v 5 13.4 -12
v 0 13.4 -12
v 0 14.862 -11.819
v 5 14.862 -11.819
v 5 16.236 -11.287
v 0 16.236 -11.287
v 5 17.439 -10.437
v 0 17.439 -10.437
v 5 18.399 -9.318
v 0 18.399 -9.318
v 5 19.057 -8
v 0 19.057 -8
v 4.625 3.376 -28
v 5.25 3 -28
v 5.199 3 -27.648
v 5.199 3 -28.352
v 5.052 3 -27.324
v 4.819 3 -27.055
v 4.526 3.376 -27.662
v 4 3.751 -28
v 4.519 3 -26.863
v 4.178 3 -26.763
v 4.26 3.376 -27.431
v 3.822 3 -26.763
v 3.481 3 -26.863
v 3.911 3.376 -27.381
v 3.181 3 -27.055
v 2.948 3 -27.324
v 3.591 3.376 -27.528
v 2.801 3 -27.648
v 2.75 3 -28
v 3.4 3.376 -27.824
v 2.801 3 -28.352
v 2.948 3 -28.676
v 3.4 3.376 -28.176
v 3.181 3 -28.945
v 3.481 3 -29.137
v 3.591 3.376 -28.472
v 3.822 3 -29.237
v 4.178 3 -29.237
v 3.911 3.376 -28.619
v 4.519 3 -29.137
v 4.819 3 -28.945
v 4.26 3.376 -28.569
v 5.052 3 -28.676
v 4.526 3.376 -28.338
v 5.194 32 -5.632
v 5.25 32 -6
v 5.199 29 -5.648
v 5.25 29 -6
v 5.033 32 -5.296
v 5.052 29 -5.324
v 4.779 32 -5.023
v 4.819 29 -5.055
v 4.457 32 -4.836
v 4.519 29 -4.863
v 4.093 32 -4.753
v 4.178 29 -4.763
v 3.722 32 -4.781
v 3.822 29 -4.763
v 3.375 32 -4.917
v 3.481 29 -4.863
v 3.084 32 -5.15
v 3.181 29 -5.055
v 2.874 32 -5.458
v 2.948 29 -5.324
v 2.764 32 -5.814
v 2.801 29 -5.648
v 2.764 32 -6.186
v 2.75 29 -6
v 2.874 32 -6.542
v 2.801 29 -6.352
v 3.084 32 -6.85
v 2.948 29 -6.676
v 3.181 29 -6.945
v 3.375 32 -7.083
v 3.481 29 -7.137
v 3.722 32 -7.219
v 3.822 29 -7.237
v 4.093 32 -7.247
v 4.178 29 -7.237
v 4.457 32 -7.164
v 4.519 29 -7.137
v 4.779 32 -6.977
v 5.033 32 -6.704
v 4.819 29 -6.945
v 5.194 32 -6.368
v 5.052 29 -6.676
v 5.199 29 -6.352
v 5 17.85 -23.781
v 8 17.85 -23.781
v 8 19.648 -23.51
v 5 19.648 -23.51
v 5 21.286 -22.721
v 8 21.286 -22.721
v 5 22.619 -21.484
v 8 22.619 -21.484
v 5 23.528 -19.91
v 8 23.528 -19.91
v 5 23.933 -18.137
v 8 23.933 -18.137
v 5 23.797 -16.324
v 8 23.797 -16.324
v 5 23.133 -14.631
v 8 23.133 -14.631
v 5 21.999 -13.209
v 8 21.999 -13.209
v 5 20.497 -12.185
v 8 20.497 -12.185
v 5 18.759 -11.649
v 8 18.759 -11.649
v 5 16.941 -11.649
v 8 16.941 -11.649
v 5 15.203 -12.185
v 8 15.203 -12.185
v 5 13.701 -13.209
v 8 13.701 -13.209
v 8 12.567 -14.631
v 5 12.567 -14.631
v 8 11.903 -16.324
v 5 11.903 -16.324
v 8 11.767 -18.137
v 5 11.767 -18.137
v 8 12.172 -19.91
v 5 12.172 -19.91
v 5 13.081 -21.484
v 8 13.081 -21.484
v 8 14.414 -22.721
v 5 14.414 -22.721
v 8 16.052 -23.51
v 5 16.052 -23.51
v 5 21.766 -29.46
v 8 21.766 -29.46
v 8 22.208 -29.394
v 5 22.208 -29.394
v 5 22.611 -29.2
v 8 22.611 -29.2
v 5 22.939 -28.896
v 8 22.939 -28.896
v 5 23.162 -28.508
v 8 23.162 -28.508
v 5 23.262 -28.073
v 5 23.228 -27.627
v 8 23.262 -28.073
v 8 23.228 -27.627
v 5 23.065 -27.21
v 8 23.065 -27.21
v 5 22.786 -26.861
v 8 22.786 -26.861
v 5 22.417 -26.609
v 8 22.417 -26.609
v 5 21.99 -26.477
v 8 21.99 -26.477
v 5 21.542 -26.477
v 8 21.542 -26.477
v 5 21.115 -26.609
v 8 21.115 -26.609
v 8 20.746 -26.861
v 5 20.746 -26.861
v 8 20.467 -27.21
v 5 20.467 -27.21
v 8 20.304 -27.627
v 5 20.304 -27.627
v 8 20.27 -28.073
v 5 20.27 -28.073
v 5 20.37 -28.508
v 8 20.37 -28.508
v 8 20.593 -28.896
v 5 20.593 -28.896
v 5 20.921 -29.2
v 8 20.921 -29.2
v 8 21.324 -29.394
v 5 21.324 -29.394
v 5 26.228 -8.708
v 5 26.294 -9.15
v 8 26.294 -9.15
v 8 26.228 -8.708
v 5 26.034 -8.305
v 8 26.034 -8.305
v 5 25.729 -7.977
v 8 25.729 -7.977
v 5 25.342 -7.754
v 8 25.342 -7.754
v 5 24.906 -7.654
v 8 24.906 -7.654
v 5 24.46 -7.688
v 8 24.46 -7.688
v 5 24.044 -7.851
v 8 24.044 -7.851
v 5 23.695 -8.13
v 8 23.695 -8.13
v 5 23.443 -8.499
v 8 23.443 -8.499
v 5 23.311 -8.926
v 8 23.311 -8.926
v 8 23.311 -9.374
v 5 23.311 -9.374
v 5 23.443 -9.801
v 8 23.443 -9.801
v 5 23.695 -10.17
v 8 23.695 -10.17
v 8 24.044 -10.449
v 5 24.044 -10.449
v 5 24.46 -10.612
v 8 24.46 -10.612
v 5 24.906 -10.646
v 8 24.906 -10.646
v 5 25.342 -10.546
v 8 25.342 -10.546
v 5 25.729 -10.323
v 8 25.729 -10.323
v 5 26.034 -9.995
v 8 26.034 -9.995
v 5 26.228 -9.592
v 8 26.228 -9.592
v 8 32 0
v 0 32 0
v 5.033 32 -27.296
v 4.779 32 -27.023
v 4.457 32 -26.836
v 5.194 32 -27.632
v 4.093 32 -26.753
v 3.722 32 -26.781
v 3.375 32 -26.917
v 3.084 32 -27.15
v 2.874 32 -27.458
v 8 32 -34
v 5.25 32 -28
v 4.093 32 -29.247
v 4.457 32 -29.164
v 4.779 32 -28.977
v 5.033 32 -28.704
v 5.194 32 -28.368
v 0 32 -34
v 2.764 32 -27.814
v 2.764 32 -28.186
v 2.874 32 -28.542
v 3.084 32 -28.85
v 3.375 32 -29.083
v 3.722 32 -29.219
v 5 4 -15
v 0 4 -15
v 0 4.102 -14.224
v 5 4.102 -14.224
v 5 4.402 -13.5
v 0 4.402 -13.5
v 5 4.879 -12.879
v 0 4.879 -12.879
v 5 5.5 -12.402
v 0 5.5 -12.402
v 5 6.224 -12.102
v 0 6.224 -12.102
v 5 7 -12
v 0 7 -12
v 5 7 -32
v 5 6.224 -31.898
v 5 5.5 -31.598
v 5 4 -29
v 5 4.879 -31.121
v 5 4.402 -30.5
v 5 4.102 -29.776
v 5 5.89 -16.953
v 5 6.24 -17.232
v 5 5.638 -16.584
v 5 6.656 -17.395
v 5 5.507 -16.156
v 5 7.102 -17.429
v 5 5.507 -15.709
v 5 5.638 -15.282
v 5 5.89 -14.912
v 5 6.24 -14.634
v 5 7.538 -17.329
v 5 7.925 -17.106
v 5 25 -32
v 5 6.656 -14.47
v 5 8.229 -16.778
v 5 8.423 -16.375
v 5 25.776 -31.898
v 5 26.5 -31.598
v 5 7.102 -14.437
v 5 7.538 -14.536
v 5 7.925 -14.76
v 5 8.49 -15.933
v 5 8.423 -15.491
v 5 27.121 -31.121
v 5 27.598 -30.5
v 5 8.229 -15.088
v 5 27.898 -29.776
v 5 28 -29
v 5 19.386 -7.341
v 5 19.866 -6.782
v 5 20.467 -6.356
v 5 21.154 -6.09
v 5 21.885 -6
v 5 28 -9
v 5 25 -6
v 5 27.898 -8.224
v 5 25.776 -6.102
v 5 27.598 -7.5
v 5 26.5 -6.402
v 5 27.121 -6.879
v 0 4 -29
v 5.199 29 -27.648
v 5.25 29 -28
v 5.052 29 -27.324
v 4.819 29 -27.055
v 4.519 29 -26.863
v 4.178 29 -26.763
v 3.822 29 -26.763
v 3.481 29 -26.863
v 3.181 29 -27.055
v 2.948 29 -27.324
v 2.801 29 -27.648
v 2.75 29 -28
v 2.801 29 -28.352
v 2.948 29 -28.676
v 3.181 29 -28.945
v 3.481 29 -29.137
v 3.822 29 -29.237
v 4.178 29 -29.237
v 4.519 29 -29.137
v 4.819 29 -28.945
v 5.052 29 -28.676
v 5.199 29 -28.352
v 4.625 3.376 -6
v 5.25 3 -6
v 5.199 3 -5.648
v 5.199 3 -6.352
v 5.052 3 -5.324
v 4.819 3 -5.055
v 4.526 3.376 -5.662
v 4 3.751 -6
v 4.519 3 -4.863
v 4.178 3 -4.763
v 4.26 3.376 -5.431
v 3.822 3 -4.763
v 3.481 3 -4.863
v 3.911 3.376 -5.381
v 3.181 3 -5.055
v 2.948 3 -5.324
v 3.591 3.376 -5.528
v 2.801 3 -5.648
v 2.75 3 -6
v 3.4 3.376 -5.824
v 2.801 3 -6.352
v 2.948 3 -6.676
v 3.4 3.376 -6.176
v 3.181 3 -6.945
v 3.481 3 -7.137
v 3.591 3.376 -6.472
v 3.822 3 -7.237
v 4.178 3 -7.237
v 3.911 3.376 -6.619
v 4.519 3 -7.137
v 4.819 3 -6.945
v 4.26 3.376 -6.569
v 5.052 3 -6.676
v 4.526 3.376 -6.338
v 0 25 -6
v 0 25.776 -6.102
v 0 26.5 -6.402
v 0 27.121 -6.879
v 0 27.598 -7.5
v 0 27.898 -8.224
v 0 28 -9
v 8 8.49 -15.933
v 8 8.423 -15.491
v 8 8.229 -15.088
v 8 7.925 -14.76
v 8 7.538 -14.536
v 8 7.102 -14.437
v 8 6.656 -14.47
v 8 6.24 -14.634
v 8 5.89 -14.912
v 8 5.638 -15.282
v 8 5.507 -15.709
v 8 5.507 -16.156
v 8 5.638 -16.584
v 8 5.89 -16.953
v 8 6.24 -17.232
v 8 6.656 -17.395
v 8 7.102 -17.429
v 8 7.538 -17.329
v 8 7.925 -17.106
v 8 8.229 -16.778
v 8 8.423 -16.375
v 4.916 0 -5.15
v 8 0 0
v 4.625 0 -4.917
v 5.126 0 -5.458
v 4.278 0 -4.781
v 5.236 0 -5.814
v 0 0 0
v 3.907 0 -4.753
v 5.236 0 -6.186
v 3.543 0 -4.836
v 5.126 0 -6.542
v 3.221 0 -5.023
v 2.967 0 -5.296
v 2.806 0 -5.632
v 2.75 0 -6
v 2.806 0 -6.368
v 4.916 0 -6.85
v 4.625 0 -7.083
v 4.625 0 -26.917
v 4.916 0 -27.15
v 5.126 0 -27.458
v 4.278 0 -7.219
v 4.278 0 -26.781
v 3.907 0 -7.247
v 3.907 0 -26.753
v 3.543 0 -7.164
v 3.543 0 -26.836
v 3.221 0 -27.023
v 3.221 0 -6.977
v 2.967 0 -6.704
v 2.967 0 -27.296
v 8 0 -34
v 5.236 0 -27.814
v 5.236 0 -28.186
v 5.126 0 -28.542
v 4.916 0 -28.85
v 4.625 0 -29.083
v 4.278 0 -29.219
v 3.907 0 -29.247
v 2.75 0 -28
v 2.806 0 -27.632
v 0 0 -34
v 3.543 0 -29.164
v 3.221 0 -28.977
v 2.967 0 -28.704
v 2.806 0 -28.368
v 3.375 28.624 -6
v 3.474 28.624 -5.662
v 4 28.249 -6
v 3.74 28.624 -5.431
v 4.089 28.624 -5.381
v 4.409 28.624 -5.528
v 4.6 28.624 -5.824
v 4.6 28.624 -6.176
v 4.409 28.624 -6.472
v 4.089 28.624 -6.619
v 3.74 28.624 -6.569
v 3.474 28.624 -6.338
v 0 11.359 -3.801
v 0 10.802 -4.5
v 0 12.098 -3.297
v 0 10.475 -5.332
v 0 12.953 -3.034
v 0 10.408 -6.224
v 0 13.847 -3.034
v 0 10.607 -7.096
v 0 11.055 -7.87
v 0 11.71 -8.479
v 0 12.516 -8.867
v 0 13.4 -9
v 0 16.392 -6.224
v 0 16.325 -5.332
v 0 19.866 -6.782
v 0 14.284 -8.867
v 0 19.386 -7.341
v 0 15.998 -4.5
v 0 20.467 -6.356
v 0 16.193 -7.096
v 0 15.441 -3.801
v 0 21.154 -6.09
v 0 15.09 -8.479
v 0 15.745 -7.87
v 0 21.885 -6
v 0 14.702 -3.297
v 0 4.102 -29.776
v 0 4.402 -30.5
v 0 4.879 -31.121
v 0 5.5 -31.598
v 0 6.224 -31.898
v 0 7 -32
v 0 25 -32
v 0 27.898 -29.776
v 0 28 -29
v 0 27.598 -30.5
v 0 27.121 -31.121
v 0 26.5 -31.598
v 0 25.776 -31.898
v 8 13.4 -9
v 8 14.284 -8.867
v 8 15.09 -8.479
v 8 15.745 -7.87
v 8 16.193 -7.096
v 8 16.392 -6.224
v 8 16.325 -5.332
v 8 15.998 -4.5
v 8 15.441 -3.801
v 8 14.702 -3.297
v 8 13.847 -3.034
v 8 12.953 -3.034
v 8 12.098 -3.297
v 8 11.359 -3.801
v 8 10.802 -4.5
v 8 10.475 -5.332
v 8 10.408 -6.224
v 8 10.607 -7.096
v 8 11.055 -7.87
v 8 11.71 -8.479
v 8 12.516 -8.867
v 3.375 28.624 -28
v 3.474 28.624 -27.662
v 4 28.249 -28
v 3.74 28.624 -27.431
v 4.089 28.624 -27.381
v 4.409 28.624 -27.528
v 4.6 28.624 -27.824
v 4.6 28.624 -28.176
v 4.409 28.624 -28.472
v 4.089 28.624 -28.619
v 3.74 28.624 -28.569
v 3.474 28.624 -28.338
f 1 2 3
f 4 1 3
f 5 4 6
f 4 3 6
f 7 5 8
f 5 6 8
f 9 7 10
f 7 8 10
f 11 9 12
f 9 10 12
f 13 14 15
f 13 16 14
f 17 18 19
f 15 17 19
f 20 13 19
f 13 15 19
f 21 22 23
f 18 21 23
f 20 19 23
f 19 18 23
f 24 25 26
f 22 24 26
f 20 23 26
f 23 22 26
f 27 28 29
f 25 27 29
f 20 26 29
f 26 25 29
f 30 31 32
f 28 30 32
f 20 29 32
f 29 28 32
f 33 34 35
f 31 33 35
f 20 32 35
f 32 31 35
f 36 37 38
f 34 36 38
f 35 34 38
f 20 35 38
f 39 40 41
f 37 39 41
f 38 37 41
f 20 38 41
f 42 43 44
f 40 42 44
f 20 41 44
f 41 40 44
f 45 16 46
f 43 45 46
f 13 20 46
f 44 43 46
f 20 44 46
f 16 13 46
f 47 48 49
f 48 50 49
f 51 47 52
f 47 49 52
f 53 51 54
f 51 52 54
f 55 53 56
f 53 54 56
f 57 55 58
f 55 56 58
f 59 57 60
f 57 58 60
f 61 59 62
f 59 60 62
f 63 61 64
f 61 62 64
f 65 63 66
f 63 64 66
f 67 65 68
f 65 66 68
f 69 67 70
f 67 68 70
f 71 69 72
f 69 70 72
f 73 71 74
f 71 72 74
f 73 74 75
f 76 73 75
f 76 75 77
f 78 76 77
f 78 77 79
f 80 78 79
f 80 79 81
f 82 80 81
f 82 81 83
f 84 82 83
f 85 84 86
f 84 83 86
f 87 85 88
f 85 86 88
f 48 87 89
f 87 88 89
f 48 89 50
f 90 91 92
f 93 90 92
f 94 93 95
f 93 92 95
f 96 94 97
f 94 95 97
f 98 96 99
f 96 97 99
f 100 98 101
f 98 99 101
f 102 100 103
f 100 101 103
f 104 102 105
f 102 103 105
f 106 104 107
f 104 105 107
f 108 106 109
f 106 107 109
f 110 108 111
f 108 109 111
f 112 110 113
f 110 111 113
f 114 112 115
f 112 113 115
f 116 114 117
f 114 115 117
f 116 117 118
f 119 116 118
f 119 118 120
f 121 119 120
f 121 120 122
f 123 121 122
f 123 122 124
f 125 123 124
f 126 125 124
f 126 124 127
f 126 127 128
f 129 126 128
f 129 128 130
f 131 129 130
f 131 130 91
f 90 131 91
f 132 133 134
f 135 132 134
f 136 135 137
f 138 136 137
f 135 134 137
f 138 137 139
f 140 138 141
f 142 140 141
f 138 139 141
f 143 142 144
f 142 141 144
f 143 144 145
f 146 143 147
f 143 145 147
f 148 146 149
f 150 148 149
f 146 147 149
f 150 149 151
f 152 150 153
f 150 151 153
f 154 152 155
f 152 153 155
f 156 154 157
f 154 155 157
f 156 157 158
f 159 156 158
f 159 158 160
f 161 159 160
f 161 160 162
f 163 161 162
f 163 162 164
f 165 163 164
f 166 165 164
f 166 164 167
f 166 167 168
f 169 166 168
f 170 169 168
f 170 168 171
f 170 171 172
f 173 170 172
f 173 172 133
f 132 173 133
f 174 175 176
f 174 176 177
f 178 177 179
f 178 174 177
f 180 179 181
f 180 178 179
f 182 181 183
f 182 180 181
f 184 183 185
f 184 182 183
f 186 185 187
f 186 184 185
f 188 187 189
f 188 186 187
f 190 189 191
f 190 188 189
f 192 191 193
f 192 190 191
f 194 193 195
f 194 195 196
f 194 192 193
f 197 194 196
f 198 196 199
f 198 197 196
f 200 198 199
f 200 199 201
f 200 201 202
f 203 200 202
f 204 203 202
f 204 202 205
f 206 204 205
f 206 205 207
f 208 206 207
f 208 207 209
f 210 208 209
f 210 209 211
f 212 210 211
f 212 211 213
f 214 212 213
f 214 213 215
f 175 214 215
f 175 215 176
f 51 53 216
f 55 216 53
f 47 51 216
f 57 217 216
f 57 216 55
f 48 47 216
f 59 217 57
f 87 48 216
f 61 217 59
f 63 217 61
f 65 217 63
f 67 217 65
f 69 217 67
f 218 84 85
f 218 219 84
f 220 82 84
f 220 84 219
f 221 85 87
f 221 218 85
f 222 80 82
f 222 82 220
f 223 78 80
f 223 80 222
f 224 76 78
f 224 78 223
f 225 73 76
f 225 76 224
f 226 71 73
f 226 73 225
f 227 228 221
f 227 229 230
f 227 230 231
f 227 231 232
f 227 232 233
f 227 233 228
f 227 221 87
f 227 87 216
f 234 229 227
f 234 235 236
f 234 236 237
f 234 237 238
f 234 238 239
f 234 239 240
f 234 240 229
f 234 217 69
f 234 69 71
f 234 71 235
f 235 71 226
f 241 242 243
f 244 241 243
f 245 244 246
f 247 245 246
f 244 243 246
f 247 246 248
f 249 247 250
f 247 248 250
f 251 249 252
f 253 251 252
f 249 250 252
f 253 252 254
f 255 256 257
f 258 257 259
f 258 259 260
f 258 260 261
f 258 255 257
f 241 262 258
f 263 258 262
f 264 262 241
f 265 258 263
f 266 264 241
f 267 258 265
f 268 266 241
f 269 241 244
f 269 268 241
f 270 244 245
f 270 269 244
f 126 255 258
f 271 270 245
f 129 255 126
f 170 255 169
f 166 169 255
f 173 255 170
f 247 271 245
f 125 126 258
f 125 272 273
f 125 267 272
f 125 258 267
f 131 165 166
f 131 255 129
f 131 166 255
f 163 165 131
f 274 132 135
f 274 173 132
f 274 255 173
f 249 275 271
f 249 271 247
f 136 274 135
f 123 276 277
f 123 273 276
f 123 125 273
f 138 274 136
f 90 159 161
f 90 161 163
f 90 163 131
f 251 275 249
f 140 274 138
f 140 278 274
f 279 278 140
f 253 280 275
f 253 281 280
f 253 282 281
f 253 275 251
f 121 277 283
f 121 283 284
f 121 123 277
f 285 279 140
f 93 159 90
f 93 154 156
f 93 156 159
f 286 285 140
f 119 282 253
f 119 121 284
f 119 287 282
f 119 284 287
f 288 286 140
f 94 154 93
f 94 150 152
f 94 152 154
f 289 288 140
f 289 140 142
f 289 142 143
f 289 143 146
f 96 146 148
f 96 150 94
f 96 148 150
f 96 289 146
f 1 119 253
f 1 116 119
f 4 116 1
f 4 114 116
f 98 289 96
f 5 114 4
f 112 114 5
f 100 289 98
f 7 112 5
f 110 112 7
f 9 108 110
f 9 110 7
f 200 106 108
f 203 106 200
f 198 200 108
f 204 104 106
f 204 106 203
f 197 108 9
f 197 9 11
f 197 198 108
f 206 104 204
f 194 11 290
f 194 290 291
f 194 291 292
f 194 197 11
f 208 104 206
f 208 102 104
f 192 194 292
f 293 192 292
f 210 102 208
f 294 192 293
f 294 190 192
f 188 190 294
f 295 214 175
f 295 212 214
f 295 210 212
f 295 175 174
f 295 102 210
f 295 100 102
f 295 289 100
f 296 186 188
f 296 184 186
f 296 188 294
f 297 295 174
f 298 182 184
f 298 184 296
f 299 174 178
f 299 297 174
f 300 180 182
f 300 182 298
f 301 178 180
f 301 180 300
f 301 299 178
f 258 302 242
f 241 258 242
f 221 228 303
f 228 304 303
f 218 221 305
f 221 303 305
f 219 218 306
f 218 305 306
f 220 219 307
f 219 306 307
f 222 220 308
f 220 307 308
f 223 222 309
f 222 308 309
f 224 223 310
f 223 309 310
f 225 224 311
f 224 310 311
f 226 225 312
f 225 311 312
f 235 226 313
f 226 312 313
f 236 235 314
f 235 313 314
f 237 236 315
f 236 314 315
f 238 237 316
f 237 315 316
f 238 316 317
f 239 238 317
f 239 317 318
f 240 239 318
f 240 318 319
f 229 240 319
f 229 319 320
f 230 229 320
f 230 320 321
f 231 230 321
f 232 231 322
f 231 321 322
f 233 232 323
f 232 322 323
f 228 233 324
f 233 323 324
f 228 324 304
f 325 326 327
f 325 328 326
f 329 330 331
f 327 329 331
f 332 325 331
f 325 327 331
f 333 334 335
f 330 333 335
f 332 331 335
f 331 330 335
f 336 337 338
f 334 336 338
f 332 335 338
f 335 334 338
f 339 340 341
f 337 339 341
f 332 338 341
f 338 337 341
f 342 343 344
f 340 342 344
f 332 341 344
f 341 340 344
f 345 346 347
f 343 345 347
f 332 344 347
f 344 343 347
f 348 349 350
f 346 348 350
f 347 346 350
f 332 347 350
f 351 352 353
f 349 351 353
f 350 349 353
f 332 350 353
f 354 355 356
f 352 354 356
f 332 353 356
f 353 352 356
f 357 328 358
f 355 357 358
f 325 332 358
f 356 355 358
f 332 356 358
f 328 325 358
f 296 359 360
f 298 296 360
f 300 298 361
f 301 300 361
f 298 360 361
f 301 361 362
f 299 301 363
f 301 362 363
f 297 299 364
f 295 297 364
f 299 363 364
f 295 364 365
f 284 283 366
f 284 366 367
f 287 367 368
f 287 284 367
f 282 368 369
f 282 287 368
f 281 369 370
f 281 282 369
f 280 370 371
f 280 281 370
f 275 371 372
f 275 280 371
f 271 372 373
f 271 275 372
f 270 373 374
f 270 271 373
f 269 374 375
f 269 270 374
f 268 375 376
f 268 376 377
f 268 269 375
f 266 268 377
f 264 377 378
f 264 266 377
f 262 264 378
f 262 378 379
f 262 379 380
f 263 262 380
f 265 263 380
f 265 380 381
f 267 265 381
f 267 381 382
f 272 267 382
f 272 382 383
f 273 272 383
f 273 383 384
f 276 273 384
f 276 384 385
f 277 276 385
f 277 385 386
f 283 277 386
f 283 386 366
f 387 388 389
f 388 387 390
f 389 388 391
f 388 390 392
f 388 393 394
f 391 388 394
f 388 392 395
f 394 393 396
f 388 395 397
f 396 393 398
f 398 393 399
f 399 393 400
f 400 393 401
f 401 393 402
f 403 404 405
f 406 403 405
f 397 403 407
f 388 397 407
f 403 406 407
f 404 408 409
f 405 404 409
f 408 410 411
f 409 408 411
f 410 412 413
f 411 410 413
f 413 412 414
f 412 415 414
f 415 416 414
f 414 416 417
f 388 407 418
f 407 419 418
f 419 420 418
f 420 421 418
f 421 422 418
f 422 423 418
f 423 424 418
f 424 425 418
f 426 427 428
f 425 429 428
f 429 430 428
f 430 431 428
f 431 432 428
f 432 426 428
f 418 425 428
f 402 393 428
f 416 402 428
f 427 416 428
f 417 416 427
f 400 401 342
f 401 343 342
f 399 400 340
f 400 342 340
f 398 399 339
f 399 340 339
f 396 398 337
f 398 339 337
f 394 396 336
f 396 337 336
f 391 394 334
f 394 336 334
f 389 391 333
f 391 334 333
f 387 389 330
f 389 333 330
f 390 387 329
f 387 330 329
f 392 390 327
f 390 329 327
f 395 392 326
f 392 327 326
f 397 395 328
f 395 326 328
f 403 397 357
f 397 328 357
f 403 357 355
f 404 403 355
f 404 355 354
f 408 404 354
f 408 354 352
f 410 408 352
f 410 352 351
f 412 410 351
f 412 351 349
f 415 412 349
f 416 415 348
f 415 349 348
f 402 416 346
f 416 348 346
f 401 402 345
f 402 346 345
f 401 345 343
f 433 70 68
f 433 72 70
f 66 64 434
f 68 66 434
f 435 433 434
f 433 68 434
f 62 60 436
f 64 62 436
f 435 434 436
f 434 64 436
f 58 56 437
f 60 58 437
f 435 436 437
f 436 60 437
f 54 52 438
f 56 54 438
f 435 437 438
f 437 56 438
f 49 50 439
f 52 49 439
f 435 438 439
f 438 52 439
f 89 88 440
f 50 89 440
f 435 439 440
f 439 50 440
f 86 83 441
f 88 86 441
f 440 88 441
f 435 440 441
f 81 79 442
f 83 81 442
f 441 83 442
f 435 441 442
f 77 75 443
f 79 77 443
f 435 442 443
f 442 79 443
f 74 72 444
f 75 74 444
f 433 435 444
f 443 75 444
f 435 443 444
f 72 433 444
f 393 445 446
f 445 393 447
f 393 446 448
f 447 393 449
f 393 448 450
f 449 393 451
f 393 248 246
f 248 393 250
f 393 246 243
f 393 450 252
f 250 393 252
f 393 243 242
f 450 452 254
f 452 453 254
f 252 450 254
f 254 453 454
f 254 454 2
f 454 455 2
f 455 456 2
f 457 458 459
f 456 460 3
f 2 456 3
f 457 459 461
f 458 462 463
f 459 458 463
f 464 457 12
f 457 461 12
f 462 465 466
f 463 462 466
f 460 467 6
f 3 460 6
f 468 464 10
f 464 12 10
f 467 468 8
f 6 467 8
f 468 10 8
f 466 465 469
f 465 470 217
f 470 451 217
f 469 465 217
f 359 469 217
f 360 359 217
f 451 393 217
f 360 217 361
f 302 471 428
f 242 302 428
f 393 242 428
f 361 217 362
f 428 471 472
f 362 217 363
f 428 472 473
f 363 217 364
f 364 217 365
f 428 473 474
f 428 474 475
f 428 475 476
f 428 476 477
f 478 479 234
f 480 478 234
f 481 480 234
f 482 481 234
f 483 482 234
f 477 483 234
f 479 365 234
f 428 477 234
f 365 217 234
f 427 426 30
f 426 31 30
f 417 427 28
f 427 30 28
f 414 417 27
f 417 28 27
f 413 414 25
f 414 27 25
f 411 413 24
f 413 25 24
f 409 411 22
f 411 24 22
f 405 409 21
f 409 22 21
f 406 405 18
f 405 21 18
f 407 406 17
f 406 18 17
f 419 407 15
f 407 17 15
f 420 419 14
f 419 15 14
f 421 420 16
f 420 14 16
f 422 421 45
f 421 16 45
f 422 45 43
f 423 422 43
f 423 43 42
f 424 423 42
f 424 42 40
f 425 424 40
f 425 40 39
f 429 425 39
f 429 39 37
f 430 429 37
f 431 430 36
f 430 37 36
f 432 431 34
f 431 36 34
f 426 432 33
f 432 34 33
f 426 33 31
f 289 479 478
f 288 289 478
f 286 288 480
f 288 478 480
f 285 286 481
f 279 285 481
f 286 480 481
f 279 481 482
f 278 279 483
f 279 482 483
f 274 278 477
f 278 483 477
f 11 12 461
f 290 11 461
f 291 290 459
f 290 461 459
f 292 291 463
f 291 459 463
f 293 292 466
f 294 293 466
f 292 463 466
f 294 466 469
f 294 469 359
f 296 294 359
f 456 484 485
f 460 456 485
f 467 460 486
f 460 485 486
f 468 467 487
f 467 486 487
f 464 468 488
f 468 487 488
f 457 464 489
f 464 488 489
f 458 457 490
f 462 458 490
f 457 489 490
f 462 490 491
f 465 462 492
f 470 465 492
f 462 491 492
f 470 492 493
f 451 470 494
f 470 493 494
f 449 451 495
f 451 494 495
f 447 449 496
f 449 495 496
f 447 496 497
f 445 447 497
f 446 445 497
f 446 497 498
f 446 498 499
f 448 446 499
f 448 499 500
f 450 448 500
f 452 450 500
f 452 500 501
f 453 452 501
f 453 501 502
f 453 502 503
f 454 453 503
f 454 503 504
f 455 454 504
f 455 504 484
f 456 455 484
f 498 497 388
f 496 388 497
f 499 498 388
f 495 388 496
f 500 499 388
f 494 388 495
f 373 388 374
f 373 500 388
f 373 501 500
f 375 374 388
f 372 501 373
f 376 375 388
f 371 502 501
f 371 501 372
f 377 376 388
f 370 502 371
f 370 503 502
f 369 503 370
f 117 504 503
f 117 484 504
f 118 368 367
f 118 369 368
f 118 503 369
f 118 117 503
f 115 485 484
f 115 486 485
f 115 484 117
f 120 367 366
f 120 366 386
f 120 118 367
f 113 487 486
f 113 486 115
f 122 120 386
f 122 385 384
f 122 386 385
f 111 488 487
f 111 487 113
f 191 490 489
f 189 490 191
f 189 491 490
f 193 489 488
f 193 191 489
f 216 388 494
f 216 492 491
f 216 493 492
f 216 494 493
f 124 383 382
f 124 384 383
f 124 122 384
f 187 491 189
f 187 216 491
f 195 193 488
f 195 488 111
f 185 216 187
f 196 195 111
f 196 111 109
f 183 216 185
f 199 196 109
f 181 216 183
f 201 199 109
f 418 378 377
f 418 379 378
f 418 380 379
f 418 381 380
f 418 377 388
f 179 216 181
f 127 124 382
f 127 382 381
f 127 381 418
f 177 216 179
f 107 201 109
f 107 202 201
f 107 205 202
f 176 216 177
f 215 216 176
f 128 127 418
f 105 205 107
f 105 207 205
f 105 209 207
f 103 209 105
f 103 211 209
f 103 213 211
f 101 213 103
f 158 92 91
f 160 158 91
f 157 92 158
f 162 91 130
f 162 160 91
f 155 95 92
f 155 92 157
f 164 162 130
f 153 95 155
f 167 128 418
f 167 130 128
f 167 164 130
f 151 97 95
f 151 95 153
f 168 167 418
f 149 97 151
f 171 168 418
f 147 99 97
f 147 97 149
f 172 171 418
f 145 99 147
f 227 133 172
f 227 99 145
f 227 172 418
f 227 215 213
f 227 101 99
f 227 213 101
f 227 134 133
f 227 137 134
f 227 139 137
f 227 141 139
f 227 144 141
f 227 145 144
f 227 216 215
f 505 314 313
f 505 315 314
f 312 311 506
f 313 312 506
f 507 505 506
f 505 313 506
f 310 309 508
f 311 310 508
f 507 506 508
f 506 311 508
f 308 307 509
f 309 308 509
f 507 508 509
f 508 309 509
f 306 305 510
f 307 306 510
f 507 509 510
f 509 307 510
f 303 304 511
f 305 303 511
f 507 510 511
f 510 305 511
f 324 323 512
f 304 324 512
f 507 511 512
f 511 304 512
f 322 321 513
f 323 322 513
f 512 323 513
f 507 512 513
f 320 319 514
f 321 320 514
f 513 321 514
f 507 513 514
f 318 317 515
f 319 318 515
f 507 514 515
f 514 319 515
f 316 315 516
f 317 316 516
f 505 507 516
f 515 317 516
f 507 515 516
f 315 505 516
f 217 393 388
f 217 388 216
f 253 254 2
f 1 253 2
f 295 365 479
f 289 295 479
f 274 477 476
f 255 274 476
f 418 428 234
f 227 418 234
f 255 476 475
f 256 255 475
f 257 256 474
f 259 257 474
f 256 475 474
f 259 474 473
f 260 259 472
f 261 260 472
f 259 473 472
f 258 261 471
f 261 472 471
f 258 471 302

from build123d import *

# Parameters (mm, degrees)
SKETCH1_W                       = 34
SKETCH1_H                       = 32
BOSS_EXTRUDE1_DEPTH             = 8
CUT_EXTRUDE1_REACH              = 49.371
SKETCH2_R                       = 6.1
SKETCH2_R_2                     = 3
SKETCH2_R_3                     = 1.5
CIRPATTERN1_OUTLINE_R           = 1.5
CIRPATTERN1_DEPTH               = 8
CUT_EXTRUDE2_DEPTH              = 5
TAP_DRILL_FOR_M3X0_5_TAP1_D     = 2.5
TAP_DRILL_FOR_M3X0_5_TAP1_DEPTH = 3
TAP_DRILL_FOR_M3X0_5_TAP1_TIP   = 0.751075774
TAP_DRILL_FOR_M3X0_5_TAP2_D     = 2.5
TAP_DRILL_FOR_M3X0_5_TAP2_DEPTH = 3
TAP_DRILL_FOR_M3X0_5_TAP2_TIP   = 0.751075774


# Read off the part's stored shape, not the designer's step: CirPattern1
with BuildPart() as part:
    # Sketch1 → Boss-Extrude1 (new body)
    with BuildSketch(Plane(origin=(0, 0, 0), x_dir=(0, 0, -1), z_dir=(1, 0, 0))):
        with Locations((17, 16)):
            Rectangle(SKETCH1_W, SKETCH1_H)
    extrude(amount=BOSS_EXTRUDE1_DEPTH)

    # Sketch2 → Cut-Extrude1 (cut, up to next)
    with BuildSketch(Plane(origin=(8, 0, 0), x_dir=(0, 0, -1), z_dir=(1, 0, 0)), mode=Mode.PRIVATE) as cut_extrude1_sk1:
        with Locations((17.681074437, 17.85)):
            Circle(SKETCH2_R)
    cut_extrude1_tool1 = extrude(cut_extrude1_sk1.sketch, amount=-CUT_EXTRUDE1_REACH, mode=Mode.PRIVATE) & part.part
    # Sketch2 → Cut-Extrude1 (cut, up to next)
    with BuildSketch(Plane(origin=(8, 0, 0), x_dir=(0, 0, -1), z_dir=(1, 0, 0)), mode=Mode.PRIVATE) as cut_extrude1_sk2:
        with Locations((6, 13.4)):
            Circle(SKETCH2_R_2)
    cut_extrude1_tool2 = extrude(cut_extrude1_sk2.sketch, amount=-CUT_EXTRUDE1_REACH, mode=Mode.PRIVATE) & part.part
    # Sketch2 → Cut-Extrude1 (cut, up to next)
    with BuildSketch(Plane(origin=(8, 0, 0), x_dir=(0, 0, -1), z_dir=(1, 0, 0)), mode=Mode.PRIVATE) as cut_extrude1_sk3:
        with Locations((27.960419941, 21.766)):
            Circle(SKETCH2_R_3)
    cut_extrude1_tool3 = extrude(cut_extrude1_sk3.sketch, amount=-CUT_EXTRUDE1_REACH, mode=Mode.PRIVATE) & part.part
    add(cut_extrude1_tool1.solids().sort_by_distance((8, 17.85, -17.681074))[0], mode=Mode.SUBTRACT)
    add(cut_extrude1_tool2.solids().sort_by_distance((8, 13.4, -6))[0], mode=Mode.SUBTRACT)
    add(cut_extrude1_tool3.solids().sort_by_distance((8, 21.766, -27.96042))[0], mode=Mode.SUBTRACT)

    # CirPattern1 outline → CirPattern1 (cut)
    with BuildSketch(Plane.YZ):
        with Locations((6.989825659, -15.932757166)):
            Circle(CIRPATTERN1_OUTLINE_R)
        with Locations((24.794174341, -9.150046203)):
            Circle(CIRPATTERN1_OUTLINE_R)
    extrude(amount=CIRPATTERN1_DEPTH, mode=Mode.SUBTRACT)

    # Sketch3 → Cut-Extrude2 (cut)
    with BuildSketch(Plane(origin=(0, 0, 0), x_dir=(0, 0, -1), z_dir=(1, 0, 0))):
        with BuildLine():
            Line((32, 25), (32, 7))
            ThreePointArc((32, 7), (31.121320344, 4.878679656), (29, 4))
            Line((29, 4), (15, 4))
            ThreePointArc((15, 4), (12.878679656, 4.878679656), (12, 7))
            Line((12, 7), (12, 13.4))
            ThreePointArc((12, 13.4), (10.898979486, 16.864101615), (8, 19.056854249))
            ThreePointArc((8, 19.056854249), (6.550510257, 20.153230567), (6, 21.885281374))
            Line((6, 21.885281374), (6, 25))
            ThreePointArc((6, 25), (6.878679656, 27.121320344), (9, 28))
            Line((9, 28), (29, 28))
            ThreePointArc((29, 28), (31.121320344, 27.121320344), (32, 25))
        make_face()
    extrude(amount=CUT_EXTRUDE2_DEPTH, mode=Mode.SUBTRACT)

    # Tap Drill for M3x0.5 Tap1
    with Locations(Plane(origin=(0, 32, 0), x_dir=(-1, 0, 0), z_dir=(0, 1, 0))):
        with Locations((-4, -6), (-4, -28)):
            Hole(TAP_DRILL_FOR_M3X0_5_TAP1_D / 2, depth=TAP_DRILL_FOR_M3X0_5_TAP1_DEPTH)
            with Locations((0, 0, -(TAP_DRILL_FOR_M3X0_5_TAP1_DEPTH + TAP_DRILL_FOR_M3X0_5_TAP1_TIP / 2))):  # 118° drill point
                Cone(0, TAP_DRILL_FOR_M3X0_5_TAP1_D / 2, TAP_DRILL_FOR_M3X0_5_TAP1_TIP, mode=Mode.SUBTRACT)

    # Tap Drill for M3x0.5 Tap2
    with Locations(Plane.XZ):
        with Locations((4, -6), (4, -28)):
            Hole(TAP_DRILL_FOR_M3X0_5_TAP2_D / 2, depth=TAP_DRILL_FOR_M3X0_5_TAP2_DEPTH)
            with Locations((0, 0, -(TAP_DRILL_FOR_M3X0_5_TAP2_DEPTH + TAP_DRILL_FOR_M3X0_5_TAP2_TIP / 2))):  # 118° drill point
                Cone(0, TAP_DRILL_FOR_M3X0_5_TAP2_D / 2, TAP_DRILL_FOR_M3X0_5_TAP2_TIP, mode=Mode.SUBTRACT)


solid = part.part
